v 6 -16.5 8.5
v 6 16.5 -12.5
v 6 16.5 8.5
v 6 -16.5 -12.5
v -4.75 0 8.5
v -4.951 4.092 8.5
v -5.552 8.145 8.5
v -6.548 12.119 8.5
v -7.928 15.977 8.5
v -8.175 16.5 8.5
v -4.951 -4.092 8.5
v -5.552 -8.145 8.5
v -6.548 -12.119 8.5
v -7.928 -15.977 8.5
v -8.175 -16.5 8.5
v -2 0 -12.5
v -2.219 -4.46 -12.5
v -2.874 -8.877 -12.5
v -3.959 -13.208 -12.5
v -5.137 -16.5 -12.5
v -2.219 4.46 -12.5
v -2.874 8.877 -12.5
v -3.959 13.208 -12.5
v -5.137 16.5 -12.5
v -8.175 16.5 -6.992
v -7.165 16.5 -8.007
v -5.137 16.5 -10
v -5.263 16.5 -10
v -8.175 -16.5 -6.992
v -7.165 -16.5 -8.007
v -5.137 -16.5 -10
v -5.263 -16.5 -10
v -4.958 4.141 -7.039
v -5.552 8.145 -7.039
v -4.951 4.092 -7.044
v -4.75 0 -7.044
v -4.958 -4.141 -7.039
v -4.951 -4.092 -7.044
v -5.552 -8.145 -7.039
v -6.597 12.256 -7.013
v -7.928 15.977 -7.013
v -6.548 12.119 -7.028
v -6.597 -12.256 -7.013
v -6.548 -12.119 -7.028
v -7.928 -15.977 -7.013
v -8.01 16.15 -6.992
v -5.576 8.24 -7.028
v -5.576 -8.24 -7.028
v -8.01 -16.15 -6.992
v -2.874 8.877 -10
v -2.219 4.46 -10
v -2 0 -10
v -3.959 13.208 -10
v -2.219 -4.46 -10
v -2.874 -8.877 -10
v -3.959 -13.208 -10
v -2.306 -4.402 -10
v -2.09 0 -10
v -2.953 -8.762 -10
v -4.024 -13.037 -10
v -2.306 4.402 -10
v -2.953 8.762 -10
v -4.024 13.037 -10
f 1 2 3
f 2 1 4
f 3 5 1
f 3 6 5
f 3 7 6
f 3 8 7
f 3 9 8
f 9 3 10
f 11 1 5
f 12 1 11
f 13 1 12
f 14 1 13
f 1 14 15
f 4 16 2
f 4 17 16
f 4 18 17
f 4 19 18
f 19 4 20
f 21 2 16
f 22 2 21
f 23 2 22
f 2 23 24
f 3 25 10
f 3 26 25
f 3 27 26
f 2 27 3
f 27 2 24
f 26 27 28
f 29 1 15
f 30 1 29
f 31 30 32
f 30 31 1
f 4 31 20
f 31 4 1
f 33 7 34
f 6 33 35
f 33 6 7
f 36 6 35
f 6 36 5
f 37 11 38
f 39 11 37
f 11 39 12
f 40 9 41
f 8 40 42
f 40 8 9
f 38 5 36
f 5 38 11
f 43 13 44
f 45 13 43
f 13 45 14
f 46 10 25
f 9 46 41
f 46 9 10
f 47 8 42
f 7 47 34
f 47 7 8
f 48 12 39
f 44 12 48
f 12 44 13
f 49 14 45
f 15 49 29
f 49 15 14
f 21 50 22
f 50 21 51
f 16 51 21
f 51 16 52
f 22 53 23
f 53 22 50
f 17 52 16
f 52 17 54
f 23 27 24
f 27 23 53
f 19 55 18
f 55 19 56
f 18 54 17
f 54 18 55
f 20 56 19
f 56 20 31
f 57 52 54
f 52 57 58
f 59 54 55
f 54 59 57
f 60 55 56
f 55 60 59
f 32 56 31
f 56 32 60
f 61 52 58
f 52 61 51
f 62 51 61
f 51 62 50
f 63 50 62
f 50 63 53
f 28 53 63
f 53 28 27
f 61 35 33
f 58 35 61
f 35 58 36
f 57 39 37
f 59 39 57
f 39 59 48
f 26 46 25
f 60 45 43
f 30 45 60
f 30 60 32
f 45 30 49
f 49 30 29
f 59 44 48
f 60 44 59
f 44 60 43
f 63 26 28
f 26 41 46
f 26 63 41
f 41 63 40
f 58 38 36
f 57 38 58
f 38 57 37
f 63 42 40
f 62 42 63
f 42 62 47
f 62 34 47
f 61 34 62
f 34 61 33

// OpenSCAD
// file: nut_banana.scad
//nut();

module nut(){
    color("pink")
    difference(){
        cylinder(d=12, h=2, center=true, $fn=6);
        cylinder(d=5.5, h=3, center=true, $fn=54);
    }
}
// main file
include <nut_banana.scad>


$fn = 64;
diam_hole = 5.4 + 0.5;


support();
//banana();

//difference() {
//    banana();
//    translate([0, -40/2, 0])
//    cube([20+1,40+1,25+1], center = true);
//}



module support() {
    difference() {
        translate([-2, 0, -2])
        cube([20-3-1,40-6-1,25-3-1], center = true);
        translate([-85/2-4, 0, 0])
        cylinder(d = 80 + 5/2 + 1, h = 150, center = true);
        
            
        translate([-85/2-5, 0, -15])
        cylinder(d = 90 + 1, h = 10, center = true);
        
        translate([-47, 0, 15-0.1])
        cylinder(d1=90, d2=0, h=50, center = true);
    }
}

//translate([0, 0, -25/2-0.5])
//banana();
//
//translate([0,20/2,-5])
//rotate([0,0,90])
//nut();
//
//translate([0,-20/2,-5])
//rotate([0,0,90])
//nut();
//color("red")
//translate([-3, 0, 0])
//cube([20,40-6,25-6], center = true);

module banana() {
    difference() {
        base();
        holes_banana();
    }

    support();
}

module base() {
    cube([20, 40, 25], center = true);
}


module holes_banana() {
    translate([0, 20/2, 0])
    cylinder(d=diam_hole, h = 50, center = true);

    translate([0, -20/2, 0])
    cylinder(d=diam_hole, h = 50, center = true);
    
    translate([-3, 0, -3])
    cube([20,40-6,25], center = true);
    
    translate([-85/2-4, 0, 0])
    cylinder(d = 80 + 5/2, h = 150, center = true);
    
    translate([-85/2-5, 0, -15])
    cylinder(d = 90, h = 10, center = true);
}
